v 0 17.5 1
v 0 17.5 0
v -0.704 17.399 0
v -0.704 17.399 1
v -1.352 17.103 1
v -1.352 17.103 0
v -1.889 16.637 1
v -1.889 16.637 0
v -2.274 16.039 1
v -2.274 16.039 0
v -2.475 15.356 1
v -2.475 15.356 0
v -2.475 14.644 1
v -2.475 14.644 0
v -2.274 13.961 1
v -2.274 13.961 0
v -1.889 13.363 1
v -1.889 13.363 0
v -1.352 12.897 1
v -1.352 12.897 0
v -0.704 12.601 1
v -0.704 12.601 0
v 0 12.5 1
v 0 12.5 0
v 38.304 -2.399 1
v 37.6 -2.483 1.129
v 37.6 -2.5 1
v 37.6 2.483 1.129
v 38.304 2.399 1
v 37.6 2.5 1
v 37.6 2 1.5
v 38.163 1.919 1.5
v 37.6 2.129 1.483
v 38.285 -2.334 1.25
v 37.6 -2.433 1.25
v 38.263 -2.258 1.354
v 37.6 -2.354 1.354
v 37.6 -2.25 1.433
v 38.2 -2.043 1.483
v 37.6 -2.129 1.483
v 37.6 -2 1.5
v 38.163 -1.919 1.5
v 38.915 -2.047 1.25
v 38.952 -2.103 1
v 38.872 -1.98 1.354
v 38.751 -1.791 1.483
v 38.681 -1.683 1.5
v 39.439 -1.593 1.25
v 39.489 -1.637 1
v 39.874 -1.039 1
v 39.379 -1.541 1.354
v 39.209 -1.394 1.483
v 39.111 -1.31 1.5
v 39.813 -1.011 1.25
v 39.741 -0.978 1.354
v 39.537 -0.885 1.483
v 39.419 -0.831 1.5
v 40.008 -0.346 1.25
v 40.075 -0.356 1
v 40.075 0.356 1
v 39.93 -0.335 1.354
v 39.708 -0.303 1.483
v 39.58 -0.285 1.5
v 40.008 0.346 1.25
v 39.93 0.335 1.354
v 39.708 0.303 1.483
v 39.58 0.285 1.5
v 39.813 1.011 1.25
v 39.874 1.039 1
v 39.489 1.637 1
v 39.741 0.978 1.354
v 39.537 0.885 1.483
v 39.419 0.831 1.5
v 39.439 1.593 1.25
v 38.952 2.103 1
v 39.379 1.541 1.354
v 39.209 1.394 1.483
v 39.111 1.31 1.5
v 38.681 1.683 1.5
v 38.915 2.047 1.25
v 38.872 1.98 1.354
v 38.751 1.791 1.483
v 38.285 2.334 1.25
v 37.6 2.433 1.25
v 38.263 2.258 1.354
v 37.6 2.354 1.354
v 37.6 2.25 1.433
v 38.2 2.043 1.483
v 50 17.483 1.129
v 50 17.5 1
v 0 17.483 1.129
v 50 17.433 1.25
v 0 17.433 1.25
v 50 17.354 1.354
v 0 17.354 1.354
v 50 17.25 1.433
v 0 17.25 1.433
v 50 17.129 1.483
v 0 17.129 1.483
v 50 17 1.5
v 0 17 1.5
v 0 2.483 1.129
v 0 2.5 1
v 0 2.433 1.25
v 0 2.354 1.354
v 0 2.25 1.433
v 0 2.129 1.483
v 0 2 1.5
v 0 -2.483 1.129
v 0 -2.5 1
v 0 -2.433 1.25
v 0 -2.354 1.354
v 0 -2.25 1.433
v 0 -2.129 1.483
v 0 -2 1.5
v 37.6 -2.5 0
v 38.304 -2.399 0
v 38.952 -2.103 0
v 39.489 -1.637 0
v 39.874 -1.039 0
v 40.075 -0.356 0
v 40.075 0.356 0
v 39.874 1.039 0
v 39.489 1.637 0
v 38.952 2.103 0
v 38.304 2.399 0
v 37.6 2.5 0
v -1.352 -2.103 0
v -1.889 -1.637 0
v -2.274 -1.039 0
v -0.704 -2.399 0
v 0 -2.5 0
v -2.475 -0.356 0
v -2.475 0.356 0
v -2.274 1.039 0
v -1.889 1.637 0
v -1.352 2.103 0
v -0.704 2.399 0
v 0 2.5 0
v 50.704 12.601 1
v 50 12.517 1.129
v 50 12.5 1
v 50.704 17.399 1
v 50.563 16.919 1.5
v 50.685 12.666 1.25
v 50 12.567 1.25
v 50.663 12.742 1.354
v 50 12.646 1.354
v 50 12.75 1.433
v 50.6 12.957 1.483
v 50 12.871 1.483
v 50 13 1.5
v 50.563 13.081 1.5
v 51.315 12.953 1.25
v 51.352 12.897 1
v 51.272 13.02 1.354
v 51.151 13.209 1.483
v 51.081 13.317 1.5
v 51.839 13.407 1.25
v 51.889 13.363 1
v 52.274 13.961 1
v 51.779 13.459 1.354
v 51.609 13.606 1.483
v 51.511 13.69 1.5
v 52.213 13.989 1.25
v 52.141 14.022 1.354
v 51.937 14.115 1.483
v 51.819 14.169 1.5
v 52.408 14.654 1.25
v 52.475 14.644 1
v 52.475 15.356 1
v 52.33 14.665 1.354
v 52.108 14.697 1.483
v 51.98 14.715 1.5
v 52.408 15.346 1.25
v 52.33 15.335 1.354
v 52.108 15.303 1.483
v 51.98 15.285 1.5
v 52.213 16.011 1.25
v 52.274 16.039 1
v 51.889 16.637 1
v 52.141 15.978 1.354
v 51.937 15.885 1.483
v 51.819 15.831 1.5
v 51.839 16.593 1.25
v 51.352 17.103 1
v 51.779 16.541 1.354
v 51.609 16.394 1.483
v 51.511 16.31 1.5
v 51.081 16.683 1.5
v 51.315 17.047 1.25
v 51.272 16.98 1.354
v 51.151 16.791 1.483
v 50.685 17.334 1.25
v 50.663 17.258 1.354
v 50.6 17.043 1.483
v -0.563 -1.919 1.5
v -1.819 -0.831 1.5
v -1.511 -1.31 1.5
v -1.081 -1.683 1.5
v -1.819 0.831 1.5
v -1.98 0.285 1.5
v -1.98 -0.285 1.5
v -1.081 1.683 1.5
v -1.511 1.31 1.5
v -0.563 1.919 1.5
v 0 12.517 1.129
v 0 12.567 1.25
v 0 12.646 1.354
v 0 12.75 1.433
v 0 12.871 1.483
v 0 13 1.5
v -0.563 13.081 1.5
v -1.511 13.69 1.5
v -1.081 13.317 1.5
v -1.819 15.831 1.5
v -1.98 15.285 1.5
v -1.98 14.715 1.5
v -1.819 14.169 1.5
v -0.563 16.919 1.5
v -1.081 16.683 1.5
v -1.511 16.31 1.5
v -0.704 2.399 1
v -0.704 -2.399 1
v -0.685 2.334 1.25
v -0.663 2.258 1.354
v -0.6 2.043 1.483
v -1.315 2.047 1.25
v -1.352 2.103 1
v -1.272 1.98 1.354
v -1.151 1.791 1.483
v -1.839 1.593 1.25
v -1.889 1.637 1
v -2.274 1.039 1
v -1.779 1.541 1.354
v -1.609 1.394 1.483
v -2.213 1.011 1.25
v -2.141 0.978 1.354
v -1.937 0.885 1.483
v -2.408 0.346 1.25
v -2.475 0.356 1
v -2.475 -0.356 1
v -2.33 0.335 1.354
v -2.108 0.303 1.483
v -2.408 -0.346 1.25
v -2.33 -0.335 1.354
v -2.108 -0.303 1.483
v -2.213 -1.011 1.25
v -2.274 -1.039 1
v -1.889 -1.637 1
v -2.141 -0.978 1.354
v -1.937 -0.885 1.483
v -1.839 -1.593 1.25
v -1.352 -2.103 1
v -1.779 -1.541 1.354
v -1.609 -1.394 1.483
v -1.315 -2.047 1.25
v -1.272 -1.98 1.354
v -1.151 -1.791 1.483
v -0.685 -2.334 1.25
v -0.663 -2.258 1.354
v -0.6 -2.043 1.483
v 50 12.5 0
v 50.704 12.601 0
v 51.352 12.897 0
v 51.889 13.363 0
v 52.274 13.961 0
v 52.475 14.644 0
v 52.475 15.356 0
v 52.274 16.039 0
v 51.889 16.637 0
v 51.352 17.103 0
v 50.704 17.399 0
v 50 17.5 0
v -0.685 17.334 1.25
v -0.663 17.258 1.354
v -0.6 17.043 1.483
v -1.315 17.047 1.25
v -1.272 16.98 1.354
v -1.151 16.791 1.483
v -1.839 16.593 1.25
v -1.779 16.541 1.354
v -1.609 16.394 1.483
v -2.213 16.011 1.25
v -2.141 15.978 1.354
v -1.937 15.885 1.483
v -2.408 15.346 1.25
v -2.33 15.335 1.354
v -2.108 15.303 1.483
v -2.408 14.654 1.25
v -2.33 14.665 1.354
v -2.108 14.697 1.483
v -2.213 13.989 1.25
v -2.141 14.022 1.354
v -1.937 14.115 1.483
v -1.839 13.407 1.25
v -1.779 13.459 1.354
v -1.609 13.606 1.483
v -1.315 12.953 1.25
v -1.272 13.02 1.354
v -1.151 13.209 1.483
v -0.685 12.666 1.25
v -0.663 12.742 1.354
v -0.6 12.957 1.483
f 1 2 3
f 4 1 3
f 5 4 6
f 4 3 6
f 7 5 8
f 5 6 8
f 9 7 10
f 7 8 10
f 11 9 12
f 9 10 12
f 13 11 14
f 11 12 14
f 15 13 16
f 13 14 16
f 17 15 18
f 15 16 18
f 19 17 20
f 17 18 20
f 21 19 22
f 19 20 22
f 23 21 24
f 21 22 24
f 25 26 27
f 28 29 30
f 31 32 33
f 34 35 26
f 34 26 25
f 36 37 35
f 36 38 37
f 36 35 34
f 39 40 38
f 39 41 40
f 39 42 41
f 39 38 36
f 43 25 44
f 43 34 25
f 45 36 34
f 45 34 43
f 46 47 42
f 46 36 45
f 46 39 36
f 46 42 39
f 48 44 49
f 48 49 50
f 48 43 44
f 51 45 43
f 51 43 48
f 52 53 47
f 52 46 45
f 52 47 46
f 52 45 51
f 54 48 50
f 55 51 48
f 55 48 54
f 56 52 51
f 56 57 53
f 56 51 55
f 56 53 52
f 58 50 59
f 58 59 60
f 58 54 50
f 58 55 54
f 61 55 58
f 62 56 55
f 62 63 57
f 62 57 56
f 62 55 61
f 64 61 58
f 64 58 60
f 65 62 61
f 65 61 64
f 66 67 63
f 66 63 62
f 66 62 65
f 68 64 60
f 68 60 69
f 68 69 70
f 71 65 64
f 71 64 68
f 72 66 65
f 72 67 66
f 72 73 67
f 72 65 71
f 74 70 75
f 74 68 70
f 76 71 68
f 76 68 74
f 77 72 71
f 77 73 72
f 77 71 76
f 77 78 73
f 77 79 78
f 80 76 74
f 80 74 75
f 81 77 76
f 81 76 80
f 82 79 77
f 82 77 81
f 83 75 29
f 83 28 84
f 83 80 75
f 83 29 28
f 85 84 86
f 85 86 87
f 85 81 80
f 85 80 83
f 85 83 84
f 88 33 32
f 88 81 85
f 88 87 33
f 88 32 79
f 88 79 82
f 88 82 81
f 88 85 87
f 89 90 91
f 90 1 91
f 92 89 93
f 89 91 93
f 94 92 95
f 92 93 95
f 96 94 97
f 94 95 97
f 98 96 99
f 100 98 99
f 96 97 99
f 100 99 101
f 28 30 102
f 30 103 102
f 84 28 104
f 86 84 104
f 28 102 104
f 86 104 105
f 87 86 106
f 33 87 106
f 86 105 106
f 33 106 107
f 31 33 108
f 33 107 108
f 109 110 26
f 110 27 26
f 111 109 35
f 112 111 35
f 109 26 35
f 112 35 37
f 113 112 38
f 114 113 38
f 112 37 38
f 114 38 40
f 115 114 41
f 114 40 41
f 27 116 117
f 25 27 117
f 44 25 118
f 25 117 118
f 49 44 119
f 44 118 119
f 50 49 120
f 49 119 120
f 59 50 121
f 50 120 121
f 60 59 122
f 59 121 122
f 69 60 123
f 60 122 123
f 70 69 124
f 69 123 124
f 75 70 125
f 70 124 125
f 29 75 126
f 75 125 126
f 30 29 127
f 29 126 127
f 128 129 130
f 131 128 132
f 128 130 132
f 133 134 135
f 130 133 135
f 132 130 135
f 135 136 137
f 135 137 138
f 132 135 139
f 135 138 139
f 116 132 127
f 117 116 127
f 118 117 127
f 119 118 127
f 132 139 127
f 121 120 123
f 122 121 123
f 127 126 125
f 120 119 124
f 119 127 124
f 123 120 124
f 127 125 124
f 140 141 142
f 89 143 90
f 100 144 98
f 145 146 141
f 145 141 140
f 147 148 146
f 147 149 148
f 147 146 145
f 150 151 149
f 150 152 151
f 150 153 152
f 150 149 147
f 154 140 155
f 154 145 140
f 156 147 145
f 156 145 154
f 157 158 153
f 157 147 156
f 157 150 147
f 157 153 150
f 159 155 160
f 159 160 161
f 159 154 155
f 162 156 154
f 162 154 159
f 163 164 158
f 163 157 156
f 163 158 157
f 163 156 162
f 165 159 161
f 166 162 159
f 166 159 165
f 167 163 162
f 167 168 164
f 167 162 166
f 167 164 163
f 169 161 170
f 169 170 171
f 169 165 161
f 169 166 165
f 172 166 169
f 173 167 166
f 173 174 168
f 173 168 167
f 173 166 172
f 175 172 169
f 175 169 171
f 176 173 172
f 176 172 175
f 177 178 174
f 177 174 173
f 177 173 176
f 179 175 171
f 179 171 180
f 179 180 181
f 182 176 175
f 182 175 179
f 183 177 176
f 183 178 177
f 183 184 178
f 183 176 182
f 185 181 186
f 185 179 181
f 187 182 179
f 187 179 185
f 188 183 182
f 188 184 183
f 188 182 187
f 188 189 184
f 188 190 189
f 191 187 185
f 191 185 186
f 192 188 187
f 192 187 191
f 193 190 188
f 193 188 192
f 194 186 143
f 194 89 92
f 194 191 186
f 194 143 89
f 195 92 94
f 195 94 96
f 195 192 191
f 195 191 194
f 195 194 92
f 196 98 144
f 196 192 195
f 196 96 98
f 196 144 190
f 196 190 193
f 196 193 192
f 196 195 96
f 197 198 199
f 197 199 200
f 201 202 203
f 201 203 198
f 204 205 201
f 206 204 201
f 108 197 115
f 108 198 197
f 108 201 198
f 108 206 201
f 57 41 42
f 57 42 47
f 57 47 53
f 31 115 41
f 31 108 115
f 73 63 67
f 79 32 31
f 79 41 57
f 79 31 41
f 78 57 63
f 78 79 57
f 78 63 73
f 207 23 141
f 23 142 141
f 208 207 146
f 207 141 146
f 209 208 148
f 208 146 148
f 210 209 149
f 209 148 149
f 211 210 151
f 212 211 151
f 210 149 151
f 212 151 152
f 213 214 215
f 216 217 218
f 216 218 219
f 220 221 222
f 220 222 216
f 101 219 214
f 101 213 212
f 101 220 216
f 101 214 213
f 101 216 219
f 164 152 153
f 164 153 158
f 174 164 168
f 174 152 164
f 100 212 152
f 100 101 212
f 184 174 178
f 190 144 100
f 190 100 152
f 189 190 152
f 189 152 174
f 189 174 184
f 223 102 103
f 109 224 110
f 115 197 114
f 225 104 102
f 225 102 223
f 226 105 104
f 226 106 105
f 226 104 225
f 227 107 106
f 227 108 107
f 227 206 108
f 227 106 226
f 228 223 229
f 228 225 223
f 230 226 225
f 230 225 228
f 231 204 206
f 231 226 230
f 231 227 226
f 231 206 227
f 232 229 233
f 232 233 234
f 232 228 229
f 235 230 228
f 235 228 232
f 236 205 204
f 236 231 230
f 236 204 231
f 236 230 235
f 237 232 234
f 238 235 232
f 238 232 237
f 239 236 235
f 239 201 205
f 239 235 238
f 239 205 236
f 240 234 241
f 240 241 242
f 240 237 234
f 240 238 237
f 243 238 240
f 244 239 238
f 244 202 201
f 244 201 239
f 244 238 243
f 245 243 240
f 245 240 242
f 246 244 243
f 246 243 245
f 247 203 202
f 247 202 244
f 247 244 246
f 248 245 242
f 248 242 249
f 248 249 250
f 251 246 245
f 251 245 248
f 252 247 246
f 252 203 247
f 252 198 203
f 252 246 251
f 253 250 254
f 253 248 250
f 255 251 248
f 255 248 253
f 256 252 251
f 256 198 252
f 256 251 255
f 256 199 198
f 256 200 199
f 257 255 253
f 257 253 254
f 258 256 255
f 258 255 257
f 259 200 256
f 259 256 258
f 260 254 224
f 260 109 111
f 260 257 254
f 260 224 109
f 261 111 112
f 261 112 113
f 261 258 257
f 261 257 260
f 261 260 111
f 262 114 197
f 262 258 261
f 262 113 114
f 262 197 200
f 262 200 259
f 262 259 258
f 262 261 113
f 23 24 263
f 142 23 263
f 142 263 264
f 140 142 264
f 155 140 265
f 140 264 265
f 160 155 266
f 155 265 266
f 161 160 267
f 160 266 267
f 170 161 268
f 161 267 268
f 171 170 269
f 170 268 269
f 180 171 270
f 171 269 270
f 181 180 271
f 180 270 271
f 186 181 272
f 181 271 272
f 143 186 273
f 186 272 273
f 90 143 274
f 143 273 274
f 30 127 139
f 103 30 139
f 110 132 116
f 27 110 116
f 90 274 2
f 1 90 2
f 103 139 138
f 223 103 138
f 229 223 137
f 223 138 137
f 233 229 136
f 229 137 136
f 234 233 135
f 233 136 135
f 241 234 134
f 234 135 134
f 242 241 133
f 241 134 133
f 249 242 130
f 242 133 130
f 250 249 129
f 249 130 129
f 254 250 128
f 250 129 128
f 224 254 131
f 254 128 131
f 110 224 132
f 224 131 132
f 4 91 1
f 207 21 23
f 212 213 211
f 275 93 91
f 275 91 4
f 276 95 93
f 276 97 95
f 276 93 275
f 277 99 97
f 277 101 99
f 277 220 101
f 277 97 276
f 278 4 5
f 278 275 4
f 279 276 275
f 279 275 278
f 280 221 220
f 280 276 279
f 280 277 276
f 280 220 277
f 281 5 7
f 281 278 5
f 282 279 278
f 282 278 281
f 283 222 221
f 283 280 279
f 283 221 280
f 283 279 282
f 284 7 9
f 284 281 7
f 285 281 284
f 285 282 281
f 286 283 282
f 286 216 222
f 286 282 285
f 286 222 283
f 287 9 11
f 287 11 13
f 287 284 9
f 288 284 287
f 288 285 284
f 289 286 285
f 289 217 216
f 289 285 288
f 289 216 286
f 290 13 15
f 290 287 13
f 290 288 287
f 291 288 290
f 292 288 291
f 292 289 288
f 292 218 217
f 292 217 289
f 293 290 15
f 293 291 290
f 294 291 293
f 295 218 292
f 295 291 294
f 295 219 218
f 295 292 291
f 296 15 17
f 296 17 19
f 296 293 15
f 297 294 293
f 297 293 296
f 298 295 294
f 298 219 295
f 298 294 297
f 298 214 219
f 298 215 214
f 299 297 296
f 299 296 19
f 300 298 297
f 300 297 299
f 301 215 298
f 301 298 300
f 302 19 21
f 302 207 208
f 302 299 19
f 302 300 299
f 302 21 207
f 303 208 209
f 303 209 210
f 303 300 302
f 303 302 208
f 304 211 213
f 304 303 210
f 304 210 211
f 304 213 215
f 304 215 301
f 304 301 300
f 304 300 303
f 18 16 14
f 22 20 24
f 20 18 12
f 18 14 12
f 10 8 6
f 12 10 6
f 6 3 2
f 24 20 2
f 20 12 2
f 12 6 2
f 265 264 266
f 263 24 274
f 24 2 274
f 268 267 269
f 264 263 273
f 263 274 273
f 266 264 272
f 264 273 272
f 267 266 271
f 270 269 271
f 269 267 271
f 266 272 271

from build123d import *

# Parameters (mm, degrees)
PAD_DEPTH    = 1.5
FILLET001_R  = 0.5
PAD001_DEPTH = 1.5
FILLET_R     = 0.5


with BuildPart() as k_rper:
    # Sketch001 → Pad (new body)
    with BuildSketch(Plane.XY):
        with BuildLine():
            ThreePointArc((0, 17.5), (-2.5, 15), (0, 12.5))
            Line((0, 12.5), (50, 12.5))
            ThreePointArc((50, 12.5), (52.5, 15), (50, 17.5))
            Line((50, 17.5), (0, 17.5))
        make_face()
    extrude(amount=PAD_DEPTH)

    # Fillet001
    fillet001_edges = [k_rper.edges().sort_by_distance(p)[0] for p in [
        (-2.5, 15, 1.5),
        (25, 12.5, 1.5),
        (52.5, 15, 1.5),
        (25, 17.5, 1.5),
    ]]
    fillet(fillet001_edges, radius=FILLET001_R)


with BuildPart() as k_rper001:
    # Sketch002 → Pad001 (new body)
    with BuildSketch(Plane.XY):
        with BuildLine():
            ThreePointArc((0, 2.5), (-2.5, 0), (0, -2.5))
            Line((0, -2.5), (37.6, -2.5))
            ThreePointArc((37.6, -2.5), (40.1, 0), (37.6, 2.5))
            Line((37.6, 2.5), (0, 2.5))
        make_face()
    extrude(amount=PAD001_DEPTH)

    # Fillet
    fillet_edges = [k_rper001.edges().sort_by_distance(p)[0] for p in [
        (-2.5, 0, 1.5),
        (18.8, -2.5, 1.5),
        (40.1, 0, 1.5),
        (18.8, 2.5, 1.5),
    ]]
    fillet(fillet_edges, radius=FILLET_R)


solid = Compound([k_rper.part, k_rper001.part])
